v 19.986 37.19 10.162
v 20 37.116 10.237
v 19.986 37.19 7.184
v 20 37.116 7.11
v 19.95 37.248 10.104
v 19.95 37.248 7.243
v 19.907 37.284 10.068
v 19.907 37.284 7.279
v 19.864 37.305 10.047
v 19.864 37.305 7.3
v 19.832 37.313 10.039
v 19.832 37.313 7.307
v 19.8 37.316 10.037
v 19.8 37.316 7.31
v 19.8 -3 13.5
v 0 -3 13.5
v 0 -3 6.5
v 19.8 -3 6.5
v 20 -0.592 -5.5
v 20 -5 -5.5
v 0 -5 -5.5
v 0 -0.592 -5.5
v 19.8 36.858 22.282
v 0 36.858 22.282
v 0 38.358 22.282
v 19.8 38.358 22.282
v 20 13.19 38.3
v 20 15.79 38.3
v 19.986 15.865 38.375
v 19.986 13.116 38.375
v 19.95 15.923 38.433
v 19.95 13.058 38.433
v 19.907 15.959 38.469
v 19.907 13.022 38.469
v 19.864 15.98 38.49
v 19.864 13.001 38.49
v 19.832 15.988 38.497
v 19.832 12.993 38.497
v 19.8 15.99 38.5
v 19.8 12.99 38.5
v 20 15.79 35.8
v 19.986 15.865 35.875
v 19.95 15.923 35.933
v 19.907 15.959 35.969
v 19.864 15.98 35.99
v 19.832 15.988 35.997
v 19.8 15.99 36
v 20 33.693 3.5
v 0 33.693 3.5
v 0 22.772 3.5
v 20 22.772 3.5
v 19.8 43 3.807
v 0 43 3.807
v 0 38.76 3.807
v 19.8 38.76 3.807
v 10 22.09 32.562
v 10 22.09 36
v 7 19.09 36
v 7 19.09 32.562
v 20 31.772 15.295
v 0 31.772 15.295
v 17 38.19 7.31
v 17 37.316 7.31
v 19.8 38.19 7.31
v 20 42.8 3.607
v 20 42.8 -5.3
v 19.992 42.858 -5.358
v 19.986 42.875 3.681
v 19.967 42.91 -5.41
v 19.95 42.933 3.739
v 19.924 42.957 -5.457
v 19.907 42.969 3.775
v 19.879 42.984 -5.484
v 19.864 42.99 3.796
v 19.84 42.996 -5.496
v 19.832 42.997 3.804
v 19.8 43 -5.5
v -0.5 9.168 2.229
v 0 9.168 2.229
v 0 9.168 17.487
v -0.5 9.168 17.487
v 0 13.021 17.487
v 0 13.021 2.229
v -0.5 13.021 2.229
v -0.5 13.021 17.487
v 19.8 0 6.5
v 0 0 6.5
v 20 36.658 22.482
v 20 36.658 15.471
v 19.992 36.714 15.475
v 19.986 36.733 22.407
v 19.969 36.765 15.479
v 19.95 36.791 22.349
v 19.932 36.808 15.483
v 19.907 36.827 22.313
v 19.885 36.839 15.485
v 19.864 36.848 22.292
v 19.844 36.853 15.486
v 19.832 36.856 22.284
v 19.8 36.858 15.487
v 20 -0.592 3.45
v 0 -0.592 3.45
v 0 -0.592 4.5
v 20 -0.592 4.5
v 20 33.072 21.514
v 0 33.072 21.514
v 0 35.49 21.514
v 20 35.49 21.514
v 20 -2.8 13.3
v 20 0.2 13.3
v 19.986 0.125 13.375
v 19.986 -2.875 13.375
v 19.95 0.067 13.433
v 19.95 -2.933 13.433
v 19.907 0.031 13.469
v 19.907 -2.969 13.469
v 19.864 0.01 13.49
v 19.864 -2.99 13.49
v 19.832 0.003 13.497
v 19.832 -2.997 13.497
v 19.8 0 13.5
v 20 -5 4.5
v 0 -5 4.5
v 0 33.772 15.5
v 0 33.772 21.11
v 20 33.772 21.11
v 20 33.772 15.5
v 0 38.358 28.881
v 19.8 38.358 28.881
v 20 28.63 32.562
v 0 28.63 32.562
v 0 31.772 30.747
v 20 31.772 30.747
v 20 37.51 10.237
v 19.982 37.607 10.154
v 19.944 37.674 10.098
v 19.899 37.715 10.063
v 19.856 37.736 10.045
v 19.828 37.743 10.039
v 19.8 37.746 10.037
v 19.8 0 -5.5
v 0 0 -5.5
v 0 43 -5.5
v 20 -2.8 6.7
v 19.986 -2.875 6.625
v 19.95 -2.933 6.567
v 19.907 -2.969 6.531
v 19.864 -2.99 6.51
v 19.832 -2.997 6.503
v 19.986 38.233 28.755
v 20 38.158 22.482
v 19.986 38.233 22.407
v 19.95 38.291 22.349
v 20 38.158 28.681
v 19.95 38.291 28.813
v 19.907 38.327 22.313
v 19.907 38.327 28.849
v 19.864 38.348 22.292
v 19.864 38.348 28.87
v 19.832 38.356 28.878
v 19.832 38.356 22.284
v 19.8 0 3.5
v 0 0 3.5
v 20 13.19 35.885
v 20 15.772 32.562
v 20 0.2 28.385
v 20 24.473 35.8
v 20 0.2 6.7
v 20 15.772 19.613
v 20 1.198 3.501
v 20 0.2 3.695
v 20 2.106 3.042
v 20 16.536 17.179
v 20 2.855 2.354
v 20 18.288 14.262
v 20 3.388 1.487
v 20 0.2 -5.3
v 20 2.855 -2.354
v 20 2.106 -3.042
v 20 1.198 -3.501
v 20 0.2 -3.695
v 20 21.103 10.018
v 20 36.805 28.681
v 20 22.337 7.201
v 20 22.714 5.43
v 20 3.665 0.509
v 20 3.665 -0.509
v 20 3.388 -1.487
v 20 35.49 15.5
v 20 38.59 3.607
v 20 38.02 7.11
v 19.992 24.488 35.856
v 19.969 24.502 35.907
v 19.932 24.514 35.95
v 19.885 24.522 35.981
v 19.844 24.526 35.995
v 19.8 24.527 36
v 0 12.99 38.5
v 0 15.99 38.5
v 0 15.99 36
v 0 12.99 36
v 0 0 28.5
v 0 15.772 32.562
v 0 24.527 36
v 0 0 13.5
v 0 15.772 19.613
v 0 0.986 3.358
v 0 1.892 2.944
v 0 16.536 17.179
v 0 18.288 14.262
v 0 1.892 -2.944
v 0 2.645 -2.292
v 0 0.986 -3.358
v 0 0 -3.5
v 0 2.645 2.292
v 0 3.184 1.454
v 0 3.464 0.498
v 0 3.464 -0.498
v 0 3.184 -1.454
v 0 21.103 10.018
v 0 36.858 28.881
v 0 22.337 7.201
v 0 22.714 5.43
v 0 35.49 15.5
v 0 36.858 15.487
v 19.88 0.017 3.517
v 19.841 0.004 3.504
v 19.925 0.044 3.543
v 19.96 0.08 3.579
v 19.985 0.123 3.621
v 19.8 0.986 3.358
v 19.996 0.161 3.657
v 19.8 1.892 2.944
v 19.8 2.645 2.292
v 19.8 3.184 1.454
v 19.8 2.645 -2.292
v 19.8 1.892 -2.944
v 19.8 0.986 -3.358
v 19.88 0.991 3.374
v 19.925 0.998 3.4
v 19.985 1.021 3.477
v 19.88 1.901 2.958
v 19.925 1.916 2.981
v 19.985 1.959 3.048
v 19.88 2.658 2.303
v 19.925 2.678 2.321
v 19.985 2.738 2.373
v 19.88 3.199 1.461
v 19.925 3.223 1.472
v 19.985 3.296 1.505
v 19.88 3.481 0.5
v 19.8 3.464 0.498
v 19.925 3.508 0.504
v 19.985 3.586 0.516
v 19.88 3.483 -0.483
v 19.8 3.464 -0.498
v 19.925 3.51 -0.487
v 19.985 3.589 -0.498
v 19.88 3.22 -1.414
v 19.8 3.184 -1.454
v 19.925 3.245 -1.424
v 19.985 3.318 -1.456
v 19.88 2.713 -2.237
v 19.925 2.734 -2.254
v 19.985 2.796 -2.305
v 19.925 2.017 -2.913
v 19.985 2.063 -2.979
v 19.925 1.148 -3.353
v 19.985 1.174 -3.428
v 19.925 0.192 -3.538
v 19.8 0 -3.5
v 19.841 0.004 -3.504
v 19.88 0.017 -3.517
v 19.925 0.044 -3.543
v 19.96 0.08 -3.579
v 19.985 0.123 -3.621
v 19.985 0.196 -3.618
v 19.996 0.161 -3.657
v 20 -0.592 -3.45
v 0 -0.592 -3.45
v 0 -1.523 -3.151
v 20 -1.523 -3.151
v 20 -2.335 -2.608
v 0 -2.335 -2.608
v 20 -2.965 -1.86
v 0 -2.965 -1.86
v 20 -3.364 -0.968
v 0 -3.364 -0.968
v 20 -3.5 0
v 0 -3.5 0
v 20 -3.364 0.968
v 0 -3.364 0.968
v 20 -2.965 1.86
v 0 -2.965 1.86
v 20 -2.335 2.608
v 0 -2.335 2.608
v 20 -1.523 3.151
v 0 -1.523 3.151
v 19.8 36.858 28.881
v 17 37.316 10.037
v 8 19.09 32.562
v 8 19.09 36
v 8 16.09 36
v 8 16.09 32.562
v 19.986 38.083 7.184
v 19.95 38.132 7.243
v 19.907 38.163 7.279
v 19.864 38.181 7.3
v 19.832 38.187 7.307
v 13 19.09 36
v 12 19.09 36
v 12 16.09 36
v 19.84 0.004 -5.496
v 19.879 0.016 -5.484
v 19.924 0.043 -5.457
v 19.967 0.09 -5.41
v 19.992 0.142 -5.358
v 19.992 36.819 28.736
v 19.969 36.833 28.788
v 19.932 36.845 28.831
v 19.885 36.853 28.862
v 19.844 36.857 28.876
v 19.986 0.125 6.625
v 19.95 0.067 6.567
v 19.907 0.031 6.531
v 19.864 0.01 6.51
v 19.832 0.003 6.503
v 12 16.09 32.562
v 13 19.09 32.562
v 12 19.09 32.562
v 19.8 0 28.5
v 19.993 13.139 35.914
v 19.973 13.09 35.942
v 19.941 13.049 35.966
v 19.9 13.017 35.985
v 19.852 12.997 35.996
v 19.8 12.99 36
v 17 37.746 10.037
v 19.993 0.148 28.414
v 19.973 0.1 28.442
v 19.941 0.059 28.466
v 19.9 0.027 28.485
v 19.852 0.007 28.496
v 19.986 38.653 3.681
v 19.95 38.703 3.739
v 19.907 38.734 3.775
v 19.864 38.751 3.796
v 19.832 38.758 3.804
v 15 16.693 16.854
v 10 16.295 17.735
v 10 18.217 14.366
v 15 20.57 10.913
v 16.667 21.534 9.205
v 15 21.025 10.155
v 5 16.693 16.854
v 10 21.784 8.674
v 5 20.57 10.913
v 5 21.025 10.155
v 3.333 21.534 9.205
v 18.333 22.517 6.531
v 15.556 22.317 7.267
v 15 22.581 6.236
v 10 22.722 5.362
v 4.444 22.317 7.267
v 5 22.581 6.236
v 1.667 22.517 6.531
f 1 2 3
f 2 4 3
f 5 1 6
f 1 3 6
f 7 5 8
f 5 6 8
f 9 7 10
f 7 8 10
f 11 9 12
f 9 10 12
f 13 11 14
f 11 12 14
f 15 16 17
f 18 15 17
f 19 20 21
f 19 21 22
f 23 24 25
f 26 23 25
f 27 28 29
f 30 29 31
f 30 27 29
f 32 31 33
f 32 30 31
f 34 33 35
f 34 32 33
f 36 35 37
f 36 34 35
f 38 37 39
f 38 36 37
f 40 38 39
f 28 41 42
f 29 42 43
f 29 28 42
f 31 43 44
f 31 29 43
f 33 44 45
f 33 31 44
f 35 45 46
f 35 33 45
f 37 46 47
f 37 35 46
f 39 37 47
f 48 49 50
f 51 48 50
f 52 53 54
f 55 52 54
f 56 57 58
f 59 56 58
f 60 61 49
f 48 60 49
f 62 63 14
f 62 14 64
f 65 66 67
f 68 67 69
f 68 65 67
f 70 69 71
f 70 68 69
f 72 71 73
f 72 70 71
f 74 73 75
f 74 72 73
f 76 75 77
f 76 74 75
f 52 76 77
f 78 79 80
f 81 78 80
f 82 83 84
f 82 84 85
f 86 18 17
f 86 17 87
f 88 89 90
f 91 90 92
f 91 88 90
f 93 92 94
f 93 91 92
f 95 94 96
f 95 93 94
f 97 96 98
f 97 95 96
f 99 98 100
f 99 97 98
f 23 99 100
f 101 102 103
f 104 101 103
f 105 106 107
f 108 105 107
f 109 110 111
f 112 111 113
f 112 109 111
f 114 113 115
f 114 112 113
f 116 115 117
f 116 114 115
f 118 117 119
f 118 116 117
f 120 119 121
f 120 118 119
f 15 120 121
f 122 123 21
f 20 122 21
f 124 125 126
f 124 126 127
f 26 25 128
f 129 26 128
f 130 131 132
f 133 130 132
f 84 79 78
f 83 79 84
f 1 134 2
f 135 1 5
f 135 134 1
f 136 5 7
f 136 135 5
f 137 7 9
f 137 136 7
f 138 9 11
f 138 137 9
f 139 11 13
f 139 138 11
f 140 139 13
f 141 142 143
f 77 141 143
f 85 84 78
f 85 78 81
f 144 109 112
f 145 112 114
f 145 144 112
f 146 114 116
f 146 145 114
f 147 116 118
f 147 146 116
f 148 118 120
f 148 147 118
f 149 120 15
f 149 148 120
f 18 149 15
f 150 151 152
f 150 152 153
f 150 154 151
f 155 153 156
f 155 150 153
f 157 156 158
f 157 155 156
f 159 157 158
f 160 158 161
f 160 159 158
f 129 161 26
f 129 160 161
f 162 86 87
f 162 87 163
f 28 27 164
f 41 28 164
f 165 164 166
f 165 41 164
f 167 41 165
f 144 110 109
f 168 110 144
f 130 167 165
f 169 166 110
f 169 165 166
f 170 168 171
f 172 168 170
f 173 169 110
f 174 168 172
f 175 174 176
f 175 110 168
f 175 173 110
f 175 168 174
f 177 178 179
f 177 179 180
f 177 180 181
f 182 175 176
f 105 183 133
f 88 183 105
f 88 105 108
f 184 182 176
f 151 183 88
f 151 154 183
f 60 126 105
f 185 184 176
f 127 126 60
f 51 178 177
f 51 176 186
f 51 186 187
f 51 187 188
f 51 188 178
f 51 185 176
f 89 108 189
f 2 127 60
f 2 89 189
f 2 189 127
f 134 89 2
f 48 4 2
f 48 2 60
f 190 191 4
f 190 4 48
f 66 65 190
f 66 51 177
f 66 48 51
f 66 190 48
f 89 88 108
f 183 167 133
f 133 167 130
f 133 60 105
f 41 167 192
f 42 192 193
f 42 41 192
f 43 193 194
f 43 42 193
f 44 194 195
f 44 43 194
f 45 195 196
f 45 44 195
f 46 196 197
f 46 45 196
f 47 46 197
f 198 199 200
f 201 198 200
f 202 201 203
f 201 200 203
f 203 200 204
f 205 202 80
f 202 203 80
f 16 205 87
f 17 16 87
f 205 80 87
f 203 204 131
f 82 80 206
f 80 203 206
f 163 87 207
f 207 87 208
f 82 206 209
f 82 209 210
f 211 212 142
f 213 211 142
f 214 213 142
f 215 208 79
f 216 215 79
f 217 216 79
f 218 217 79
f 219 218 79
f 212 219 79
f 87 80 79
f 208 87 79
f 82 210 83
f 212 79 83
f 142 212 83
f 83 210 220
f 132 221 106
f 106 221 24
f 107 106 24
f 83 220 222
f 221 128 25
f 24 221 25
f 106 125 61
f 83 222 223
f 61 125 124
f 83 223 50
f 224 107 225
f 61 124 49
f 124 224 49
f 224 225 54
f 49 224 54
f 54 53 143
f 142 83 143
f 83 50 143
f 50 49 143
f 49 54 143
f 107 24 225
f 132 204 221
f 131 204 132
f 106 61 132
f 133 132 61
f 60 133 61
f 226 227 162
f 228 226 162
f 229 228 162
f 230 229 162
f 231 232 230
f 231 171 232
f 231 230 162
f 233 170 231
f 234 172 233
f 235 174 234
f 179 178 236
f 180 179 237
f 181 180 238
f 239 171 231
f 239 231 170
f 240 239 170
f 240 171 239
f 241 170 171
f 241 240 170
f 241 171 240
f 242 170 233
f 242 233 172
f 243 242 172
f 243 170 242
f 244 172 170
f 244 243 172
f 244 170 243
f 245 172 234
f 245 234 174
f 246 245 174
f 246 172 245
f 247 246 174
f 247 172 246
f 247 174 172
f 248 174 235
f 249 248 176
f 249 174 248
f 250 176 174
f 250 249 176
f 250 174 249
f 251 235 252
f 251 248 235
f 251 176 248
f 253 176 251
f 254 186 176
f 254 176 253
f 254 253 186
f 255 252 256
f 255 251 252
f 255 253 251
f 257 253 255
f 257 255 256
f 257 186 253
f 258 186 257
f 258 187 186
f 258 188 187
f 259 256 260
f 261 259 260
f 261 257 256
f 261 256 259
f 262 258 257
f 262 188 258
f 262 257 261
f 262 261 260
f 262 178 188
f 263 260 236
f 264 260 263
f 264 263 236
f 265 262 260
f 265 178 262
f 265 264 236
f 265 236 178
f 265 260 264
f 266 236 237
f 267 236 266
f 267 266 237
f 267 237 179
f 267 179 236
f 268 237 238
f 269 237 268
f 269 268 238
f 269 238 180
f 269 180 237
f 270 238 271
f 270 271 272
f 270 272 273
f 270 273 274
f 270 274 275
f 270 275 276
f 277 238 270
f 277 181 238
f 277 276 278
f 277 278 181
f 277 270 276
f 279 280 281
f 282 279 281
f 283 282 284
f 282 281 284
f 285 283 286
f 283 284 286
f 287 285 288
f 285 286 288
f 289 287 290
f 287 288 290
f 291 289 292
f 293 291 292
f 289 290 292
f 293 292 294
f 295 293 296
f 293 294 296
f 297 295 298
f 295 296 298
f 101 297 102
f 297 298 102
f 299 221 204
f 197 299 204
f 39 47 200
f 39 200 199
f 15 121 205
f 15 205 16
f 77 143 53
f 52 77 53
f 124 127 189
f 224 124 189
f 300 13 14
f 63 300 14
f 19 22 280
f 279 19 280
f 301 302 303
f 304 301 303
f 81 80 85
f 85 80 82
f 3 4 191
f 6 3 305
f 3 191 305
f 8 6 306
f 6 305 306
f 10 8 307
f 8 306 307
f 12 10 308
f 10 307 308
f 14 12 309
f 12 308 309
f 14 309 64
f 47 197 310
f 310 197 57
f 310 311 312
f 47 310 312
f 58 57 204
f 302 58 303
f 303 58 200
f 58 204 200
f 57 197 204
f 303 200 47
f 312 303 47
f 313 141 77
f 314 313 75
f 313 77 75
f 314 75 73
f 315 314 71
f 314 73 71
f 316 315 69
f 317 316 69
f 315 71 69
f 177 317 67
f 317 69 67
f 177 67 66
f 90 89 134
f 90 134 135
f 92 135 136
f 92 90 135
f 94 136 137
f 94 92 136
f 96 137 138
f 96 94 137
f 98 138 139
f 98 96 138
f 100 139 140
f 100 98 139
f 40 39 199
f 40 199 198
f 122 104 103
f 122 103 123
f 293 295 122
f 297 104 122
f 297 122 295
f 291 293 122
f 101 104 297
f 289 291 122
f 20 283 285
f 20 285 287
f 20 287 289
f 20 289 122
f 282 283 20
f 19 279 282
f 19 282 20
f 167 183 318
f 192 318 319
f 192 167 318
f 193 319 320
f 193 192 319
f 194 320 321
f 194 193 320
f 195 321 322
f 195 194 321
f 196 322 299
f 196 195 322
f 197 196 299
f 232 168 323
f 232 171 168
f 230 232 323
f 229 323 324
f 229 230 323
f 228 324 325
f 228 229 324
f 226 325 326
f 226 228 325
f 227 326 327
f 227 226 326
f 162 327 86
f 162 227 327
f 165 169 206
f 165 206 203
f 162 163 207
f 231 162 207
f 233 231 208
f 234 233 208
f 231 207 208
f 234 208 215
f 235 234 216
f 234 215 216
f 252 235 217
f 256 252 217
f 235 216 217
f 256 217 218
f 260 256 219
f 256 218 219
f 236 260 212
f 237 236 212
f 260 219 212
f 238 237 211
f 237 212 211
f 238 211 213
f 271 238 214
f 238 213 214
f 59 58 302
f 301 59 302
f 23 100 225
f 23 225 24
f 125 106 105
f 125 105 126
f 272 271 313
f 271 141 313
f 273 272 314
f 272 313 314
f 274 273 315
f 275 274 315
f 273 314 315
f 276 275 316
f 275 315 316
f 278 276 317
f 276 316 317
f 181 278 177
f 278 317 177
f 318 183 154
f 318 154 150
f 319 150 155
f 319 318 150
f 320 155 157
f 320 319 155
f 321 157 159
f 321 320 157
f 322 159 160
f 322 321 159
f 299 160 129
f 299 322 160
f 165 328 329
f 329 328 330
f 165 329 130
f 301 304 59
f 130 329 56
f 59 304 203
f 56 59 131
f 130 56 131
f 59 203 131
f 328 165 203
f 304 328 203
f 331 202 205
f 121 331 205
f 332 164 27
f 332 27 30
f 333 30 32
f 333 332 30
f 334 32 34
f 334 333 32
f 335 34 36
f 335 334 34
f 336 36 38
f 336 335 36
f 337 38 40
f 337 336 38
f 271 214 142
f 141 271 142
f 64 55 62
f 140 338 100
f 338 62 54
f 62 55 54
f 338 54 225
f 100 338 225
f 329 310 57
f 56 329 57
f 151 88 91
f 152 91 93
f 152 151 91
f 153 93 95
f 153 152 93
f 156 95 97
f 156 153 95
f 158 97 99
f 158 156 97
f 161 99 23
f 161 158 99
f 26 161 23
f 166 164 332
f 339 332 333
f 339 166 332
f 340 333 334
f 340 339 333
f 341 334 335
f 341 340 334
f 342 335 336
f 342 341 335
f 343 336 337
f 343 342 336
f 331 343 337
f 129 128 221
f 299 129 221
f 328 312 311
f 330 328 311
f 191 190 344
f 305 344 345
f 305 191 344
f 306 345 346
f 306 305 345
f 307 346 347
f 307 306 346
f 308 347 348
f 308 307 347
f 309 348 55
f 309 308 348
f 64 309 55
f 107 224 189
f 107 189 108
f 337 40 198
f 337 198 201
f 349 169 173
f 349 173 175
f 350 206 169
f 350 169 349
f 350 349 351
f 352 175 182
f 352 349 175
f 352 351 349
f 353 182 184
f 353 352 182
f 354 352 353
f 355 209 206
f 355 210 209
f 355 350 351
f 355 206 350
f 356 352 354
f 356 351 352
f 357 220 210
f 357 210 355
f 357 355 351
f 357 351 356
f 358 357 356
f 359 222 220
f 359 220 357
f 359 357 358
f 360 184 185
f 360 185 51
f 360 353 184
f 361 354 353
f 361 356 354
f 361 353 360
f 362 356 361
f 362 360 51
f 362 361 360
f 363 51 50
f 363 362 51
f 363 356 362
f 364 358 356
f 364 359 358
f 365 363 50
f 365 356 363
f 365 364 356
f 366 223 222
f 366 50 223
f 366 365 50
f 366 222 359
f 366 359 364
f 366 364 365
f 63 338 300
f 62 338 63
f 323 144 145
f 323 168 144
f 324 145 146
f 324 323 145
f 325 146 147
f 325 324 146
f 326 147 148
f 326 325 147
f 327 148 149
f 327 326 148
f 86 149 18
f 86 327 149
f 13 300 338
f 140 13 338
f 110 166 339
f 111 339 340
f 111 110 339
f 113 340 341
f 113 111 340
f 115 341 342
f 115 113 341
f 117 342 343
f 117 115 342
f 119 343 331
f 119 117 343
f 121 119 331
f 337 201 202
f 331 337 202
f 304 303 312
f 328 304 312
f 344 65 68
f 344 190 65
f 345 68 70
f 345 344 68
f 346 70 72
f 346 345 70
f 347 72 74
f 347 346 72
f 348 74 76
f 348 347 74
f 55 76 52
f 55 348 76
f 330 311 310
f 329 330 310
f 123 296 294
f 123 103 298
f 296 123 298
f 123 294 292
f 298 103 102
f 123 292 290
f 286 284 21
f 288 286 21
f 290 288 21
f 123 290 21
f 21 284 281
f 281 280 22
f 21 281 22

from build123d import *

# Parameters (mm, degrees)
BOSS_EXTRUDE4_DEPTH   = 20
BOSS_EXTRUDE4_2_DEPTH = 20
SKETCH2_W             = 2.726749215
SKETCH2_H             = 1.108217781
CUT_EXTRUDE1_DEPTH    = 3
CUT_EXTRUDE2_DEPTH    = 3.438454738
FILLET3_R             = 0.2
SKETCH5_W             = 15.257743359
SKETCH5_H             = 3.852751868
BOSS_EXTRUDE6_DEPTH   = 0.5


with BuildPart() as part:
    # Sketch1 → Boss-Extrude4 (new body)
    with BuildSketch(Plane(origin=(0, 0, 0), x_dir=(0, 0, -1), z_dir=(1, 0, 0))):
        with BuildLine():
            Line((3.5, 0), (5.5, 0))
            Line((5.5, 0), (5.5, 43))
            Line((5.5, 43), (-3.806743928, 43))
            Line((-3.806743928, 43), (-3.806743928, 38.760188506))
            Line((-3.806743928, 38.760188506), (-15.486850398, 36.858128752))
            Line((-15.486850398, 36.858128752), (-22.281500583, 36.858128752))
            Line((-22.281500583, 36.858128752), (-22.281500583, 38.358128752))
            Line((-22.281500583, 38.358128752), (-28.880599398, 38.358128752))
            Line((-28.880599398, 38.358128752), (-28.880599398, 36.858128752))
            Line((-28.880599398, 36.858128752), (-36, 24.526965191))
            Line((-36, 24.526965191), (-36, 15.990381057))
            Line((-36, 15.990381057), (-38.5, 15.990381057))
            Line((-38.5, 15.990381057), (-38.5, 12.990381057))
            Line((-38.5, 12.990381057), (-36, 12.990381057))
            Line((-36, 12.990381057), (-28.5, 0))
            Line((-28.5, 0), (-13.5, 0))
            Line((-13.5, 0), (-13.5, -3))
            Line((-13.5, -3), (-6.5, -3))
            Line((-6.5, -3), (-6.5, 0))
            Line((-6.5, 0), (-3.5, 0))
            ThreePointArc((-3.5, 0), (0, 3.5), (3.5, 0))
        make_face()
        Polygon((-21.513655911, 33.751666658), (-21.513655911, 33.071841875), (-21.109510722, 33.771841875), (-15.5, 33.771841875), (-15.5, 35.490029279), (-21.513655911, 35.490029279), align=None, mode=Mode.SUBTRACT)
        with BuildLine():
            Line((-32.561545262, 15.771841875), (-32.561545262, 28.629664887))
            Line((-32.561545262, 28.629664887), (-30.747408532, 31.771841875))
            Line((-30.747408532, 31.771841875), (-15.295375391, 31.771841875))
            Line((-15.295375391, 31.771841875), (-3.5, 33.692672724))
            Line((-3.5, 33.692672724), (-3.5, 22.771841875))
            add(Edge.make_bspline(
                [(-19.613060355, 15.771841875), (-17.641693556, 16.075420699), (-12.572544243, 19.227163792), (-7.991758563, 23.043956777), (-3.5, 22.771841875)],
                knots=[0, 0, 0, 0, 0.328341764, 1, 1, 1, 1], degree=3))
            Line((-19.613060355, 15.771841875), (-32.561545262, 15.771841875))
        make_face(mode=Mode.SUBTRACT)
    extrude(amount=BOSS_EXTRUDE4_DEPTH)

    # Sketch2 → Cut-Extrude1 (cut)
    with BuildSketch(Plane(origin=(20, 0, 0), x_dir=(0, 0, -1), z_dir=(1, 0, 0))):
        with Locations((-8.673305173, 37.869668981)):
            Rectangle(SKETCH2_W, SKETCH2_H)
    extrude(amount=-CUT_EXTRUDE1_DEPTH, mode=Mode.SUBTRACT)

    # Sketch3 → Cut-Extrude2 (cut)
    with BuildSketch(Plane.XY.offset(36)):
        Polygon((8, 16.090381057), (12, 16.090381057), (12, 19.090381057), (13, 19.090381057), (10, 22.090381057), (7, 19.090381057), (8, 19.090381057), align=None)
    extrude(amount=-CUT_EXTRUDE2_DEPTH, mode=Mode.SUBTRACT)

    # Fillet3
    fillet3_edges = [part.edges().sort_by_distance(p)[0] for p in [
        (20, 21.5, -5.5),
        (20, 37.752634163, 7.309930565),
        (20, 37.530613929, 10.03667978),
        (20, 37.315560091, 8.673305173),
        (20, 43, -0.846628036),
        (20, 40.880094253, 3.806743928),
        (20, 38.47494837, 5.558337246),
        (20, 36.858128752, 18.88417549),
        (20, 37.608128752, 22.281500583),
        (20, 38.358128752, 25.581049991),
        (20, 37.608128752, 28.880599398),
        (20, 30.692546971, 32.440299699),
        (20, 20.258673124, 36),
        (20, 3.5, 0),
        (20, 15.990381057, 37.25),
        (20, 14.490381057, 38.5),
        (20, 12.990381057, 37.25),
        (20, 6.495190528, 32.25),
        (20, 0, 21),
        (20, -1.5, 13.5),
        (20, -3, 10),
        (20, -1.5, 6.5),
        (20, 0, 5),
        (20, 0, -4.5),
        (20, 37.301898259, 12.761765089),
    ]]
    fillet(fillet3_edges, radius=FILLET3_R)

    # Sketch5 → Boss-Extrude6 (add)
    with BuildSketch(Plane.ZY):
        with Locations((9.857947025, 11.094561214)):
            Rectangle(SKETCH5_W, SKETCH5_H)
    extrude(amount=BOSS_EXTRUDE6_DEPTH)


with BuildPart() as body_2:
    # Sketch1 → Boss-Extrude4 2 (new body)
    with BuildSketch(Plane(origin=(0, 0, 0), x_dir=(0, 0, -1), z_dir=(1, 0, 0))):
        with BuildLine():
            Line((-3.449625002, -0.591681791), (-4.5, -0.591681791))
            Line((-4.5, -0.591681791), (-4.5, -5))
            Line((-4.5, -5), (5.5, -5))
            Line((5.5, -5), (5.5, -0.591681791))
            Line((5.5, -0.591681791), (3.449625002, -0.591681791))
            ThreePointArc((3.449625002, -0.591681791), (0, -3.5), (-3.449625002, -0.591681791))
        make_face()
    extrude(amount=BOSS_EXTRUDE4_2_DEPTH)


solid = Compound([part.part, body_2.part])
